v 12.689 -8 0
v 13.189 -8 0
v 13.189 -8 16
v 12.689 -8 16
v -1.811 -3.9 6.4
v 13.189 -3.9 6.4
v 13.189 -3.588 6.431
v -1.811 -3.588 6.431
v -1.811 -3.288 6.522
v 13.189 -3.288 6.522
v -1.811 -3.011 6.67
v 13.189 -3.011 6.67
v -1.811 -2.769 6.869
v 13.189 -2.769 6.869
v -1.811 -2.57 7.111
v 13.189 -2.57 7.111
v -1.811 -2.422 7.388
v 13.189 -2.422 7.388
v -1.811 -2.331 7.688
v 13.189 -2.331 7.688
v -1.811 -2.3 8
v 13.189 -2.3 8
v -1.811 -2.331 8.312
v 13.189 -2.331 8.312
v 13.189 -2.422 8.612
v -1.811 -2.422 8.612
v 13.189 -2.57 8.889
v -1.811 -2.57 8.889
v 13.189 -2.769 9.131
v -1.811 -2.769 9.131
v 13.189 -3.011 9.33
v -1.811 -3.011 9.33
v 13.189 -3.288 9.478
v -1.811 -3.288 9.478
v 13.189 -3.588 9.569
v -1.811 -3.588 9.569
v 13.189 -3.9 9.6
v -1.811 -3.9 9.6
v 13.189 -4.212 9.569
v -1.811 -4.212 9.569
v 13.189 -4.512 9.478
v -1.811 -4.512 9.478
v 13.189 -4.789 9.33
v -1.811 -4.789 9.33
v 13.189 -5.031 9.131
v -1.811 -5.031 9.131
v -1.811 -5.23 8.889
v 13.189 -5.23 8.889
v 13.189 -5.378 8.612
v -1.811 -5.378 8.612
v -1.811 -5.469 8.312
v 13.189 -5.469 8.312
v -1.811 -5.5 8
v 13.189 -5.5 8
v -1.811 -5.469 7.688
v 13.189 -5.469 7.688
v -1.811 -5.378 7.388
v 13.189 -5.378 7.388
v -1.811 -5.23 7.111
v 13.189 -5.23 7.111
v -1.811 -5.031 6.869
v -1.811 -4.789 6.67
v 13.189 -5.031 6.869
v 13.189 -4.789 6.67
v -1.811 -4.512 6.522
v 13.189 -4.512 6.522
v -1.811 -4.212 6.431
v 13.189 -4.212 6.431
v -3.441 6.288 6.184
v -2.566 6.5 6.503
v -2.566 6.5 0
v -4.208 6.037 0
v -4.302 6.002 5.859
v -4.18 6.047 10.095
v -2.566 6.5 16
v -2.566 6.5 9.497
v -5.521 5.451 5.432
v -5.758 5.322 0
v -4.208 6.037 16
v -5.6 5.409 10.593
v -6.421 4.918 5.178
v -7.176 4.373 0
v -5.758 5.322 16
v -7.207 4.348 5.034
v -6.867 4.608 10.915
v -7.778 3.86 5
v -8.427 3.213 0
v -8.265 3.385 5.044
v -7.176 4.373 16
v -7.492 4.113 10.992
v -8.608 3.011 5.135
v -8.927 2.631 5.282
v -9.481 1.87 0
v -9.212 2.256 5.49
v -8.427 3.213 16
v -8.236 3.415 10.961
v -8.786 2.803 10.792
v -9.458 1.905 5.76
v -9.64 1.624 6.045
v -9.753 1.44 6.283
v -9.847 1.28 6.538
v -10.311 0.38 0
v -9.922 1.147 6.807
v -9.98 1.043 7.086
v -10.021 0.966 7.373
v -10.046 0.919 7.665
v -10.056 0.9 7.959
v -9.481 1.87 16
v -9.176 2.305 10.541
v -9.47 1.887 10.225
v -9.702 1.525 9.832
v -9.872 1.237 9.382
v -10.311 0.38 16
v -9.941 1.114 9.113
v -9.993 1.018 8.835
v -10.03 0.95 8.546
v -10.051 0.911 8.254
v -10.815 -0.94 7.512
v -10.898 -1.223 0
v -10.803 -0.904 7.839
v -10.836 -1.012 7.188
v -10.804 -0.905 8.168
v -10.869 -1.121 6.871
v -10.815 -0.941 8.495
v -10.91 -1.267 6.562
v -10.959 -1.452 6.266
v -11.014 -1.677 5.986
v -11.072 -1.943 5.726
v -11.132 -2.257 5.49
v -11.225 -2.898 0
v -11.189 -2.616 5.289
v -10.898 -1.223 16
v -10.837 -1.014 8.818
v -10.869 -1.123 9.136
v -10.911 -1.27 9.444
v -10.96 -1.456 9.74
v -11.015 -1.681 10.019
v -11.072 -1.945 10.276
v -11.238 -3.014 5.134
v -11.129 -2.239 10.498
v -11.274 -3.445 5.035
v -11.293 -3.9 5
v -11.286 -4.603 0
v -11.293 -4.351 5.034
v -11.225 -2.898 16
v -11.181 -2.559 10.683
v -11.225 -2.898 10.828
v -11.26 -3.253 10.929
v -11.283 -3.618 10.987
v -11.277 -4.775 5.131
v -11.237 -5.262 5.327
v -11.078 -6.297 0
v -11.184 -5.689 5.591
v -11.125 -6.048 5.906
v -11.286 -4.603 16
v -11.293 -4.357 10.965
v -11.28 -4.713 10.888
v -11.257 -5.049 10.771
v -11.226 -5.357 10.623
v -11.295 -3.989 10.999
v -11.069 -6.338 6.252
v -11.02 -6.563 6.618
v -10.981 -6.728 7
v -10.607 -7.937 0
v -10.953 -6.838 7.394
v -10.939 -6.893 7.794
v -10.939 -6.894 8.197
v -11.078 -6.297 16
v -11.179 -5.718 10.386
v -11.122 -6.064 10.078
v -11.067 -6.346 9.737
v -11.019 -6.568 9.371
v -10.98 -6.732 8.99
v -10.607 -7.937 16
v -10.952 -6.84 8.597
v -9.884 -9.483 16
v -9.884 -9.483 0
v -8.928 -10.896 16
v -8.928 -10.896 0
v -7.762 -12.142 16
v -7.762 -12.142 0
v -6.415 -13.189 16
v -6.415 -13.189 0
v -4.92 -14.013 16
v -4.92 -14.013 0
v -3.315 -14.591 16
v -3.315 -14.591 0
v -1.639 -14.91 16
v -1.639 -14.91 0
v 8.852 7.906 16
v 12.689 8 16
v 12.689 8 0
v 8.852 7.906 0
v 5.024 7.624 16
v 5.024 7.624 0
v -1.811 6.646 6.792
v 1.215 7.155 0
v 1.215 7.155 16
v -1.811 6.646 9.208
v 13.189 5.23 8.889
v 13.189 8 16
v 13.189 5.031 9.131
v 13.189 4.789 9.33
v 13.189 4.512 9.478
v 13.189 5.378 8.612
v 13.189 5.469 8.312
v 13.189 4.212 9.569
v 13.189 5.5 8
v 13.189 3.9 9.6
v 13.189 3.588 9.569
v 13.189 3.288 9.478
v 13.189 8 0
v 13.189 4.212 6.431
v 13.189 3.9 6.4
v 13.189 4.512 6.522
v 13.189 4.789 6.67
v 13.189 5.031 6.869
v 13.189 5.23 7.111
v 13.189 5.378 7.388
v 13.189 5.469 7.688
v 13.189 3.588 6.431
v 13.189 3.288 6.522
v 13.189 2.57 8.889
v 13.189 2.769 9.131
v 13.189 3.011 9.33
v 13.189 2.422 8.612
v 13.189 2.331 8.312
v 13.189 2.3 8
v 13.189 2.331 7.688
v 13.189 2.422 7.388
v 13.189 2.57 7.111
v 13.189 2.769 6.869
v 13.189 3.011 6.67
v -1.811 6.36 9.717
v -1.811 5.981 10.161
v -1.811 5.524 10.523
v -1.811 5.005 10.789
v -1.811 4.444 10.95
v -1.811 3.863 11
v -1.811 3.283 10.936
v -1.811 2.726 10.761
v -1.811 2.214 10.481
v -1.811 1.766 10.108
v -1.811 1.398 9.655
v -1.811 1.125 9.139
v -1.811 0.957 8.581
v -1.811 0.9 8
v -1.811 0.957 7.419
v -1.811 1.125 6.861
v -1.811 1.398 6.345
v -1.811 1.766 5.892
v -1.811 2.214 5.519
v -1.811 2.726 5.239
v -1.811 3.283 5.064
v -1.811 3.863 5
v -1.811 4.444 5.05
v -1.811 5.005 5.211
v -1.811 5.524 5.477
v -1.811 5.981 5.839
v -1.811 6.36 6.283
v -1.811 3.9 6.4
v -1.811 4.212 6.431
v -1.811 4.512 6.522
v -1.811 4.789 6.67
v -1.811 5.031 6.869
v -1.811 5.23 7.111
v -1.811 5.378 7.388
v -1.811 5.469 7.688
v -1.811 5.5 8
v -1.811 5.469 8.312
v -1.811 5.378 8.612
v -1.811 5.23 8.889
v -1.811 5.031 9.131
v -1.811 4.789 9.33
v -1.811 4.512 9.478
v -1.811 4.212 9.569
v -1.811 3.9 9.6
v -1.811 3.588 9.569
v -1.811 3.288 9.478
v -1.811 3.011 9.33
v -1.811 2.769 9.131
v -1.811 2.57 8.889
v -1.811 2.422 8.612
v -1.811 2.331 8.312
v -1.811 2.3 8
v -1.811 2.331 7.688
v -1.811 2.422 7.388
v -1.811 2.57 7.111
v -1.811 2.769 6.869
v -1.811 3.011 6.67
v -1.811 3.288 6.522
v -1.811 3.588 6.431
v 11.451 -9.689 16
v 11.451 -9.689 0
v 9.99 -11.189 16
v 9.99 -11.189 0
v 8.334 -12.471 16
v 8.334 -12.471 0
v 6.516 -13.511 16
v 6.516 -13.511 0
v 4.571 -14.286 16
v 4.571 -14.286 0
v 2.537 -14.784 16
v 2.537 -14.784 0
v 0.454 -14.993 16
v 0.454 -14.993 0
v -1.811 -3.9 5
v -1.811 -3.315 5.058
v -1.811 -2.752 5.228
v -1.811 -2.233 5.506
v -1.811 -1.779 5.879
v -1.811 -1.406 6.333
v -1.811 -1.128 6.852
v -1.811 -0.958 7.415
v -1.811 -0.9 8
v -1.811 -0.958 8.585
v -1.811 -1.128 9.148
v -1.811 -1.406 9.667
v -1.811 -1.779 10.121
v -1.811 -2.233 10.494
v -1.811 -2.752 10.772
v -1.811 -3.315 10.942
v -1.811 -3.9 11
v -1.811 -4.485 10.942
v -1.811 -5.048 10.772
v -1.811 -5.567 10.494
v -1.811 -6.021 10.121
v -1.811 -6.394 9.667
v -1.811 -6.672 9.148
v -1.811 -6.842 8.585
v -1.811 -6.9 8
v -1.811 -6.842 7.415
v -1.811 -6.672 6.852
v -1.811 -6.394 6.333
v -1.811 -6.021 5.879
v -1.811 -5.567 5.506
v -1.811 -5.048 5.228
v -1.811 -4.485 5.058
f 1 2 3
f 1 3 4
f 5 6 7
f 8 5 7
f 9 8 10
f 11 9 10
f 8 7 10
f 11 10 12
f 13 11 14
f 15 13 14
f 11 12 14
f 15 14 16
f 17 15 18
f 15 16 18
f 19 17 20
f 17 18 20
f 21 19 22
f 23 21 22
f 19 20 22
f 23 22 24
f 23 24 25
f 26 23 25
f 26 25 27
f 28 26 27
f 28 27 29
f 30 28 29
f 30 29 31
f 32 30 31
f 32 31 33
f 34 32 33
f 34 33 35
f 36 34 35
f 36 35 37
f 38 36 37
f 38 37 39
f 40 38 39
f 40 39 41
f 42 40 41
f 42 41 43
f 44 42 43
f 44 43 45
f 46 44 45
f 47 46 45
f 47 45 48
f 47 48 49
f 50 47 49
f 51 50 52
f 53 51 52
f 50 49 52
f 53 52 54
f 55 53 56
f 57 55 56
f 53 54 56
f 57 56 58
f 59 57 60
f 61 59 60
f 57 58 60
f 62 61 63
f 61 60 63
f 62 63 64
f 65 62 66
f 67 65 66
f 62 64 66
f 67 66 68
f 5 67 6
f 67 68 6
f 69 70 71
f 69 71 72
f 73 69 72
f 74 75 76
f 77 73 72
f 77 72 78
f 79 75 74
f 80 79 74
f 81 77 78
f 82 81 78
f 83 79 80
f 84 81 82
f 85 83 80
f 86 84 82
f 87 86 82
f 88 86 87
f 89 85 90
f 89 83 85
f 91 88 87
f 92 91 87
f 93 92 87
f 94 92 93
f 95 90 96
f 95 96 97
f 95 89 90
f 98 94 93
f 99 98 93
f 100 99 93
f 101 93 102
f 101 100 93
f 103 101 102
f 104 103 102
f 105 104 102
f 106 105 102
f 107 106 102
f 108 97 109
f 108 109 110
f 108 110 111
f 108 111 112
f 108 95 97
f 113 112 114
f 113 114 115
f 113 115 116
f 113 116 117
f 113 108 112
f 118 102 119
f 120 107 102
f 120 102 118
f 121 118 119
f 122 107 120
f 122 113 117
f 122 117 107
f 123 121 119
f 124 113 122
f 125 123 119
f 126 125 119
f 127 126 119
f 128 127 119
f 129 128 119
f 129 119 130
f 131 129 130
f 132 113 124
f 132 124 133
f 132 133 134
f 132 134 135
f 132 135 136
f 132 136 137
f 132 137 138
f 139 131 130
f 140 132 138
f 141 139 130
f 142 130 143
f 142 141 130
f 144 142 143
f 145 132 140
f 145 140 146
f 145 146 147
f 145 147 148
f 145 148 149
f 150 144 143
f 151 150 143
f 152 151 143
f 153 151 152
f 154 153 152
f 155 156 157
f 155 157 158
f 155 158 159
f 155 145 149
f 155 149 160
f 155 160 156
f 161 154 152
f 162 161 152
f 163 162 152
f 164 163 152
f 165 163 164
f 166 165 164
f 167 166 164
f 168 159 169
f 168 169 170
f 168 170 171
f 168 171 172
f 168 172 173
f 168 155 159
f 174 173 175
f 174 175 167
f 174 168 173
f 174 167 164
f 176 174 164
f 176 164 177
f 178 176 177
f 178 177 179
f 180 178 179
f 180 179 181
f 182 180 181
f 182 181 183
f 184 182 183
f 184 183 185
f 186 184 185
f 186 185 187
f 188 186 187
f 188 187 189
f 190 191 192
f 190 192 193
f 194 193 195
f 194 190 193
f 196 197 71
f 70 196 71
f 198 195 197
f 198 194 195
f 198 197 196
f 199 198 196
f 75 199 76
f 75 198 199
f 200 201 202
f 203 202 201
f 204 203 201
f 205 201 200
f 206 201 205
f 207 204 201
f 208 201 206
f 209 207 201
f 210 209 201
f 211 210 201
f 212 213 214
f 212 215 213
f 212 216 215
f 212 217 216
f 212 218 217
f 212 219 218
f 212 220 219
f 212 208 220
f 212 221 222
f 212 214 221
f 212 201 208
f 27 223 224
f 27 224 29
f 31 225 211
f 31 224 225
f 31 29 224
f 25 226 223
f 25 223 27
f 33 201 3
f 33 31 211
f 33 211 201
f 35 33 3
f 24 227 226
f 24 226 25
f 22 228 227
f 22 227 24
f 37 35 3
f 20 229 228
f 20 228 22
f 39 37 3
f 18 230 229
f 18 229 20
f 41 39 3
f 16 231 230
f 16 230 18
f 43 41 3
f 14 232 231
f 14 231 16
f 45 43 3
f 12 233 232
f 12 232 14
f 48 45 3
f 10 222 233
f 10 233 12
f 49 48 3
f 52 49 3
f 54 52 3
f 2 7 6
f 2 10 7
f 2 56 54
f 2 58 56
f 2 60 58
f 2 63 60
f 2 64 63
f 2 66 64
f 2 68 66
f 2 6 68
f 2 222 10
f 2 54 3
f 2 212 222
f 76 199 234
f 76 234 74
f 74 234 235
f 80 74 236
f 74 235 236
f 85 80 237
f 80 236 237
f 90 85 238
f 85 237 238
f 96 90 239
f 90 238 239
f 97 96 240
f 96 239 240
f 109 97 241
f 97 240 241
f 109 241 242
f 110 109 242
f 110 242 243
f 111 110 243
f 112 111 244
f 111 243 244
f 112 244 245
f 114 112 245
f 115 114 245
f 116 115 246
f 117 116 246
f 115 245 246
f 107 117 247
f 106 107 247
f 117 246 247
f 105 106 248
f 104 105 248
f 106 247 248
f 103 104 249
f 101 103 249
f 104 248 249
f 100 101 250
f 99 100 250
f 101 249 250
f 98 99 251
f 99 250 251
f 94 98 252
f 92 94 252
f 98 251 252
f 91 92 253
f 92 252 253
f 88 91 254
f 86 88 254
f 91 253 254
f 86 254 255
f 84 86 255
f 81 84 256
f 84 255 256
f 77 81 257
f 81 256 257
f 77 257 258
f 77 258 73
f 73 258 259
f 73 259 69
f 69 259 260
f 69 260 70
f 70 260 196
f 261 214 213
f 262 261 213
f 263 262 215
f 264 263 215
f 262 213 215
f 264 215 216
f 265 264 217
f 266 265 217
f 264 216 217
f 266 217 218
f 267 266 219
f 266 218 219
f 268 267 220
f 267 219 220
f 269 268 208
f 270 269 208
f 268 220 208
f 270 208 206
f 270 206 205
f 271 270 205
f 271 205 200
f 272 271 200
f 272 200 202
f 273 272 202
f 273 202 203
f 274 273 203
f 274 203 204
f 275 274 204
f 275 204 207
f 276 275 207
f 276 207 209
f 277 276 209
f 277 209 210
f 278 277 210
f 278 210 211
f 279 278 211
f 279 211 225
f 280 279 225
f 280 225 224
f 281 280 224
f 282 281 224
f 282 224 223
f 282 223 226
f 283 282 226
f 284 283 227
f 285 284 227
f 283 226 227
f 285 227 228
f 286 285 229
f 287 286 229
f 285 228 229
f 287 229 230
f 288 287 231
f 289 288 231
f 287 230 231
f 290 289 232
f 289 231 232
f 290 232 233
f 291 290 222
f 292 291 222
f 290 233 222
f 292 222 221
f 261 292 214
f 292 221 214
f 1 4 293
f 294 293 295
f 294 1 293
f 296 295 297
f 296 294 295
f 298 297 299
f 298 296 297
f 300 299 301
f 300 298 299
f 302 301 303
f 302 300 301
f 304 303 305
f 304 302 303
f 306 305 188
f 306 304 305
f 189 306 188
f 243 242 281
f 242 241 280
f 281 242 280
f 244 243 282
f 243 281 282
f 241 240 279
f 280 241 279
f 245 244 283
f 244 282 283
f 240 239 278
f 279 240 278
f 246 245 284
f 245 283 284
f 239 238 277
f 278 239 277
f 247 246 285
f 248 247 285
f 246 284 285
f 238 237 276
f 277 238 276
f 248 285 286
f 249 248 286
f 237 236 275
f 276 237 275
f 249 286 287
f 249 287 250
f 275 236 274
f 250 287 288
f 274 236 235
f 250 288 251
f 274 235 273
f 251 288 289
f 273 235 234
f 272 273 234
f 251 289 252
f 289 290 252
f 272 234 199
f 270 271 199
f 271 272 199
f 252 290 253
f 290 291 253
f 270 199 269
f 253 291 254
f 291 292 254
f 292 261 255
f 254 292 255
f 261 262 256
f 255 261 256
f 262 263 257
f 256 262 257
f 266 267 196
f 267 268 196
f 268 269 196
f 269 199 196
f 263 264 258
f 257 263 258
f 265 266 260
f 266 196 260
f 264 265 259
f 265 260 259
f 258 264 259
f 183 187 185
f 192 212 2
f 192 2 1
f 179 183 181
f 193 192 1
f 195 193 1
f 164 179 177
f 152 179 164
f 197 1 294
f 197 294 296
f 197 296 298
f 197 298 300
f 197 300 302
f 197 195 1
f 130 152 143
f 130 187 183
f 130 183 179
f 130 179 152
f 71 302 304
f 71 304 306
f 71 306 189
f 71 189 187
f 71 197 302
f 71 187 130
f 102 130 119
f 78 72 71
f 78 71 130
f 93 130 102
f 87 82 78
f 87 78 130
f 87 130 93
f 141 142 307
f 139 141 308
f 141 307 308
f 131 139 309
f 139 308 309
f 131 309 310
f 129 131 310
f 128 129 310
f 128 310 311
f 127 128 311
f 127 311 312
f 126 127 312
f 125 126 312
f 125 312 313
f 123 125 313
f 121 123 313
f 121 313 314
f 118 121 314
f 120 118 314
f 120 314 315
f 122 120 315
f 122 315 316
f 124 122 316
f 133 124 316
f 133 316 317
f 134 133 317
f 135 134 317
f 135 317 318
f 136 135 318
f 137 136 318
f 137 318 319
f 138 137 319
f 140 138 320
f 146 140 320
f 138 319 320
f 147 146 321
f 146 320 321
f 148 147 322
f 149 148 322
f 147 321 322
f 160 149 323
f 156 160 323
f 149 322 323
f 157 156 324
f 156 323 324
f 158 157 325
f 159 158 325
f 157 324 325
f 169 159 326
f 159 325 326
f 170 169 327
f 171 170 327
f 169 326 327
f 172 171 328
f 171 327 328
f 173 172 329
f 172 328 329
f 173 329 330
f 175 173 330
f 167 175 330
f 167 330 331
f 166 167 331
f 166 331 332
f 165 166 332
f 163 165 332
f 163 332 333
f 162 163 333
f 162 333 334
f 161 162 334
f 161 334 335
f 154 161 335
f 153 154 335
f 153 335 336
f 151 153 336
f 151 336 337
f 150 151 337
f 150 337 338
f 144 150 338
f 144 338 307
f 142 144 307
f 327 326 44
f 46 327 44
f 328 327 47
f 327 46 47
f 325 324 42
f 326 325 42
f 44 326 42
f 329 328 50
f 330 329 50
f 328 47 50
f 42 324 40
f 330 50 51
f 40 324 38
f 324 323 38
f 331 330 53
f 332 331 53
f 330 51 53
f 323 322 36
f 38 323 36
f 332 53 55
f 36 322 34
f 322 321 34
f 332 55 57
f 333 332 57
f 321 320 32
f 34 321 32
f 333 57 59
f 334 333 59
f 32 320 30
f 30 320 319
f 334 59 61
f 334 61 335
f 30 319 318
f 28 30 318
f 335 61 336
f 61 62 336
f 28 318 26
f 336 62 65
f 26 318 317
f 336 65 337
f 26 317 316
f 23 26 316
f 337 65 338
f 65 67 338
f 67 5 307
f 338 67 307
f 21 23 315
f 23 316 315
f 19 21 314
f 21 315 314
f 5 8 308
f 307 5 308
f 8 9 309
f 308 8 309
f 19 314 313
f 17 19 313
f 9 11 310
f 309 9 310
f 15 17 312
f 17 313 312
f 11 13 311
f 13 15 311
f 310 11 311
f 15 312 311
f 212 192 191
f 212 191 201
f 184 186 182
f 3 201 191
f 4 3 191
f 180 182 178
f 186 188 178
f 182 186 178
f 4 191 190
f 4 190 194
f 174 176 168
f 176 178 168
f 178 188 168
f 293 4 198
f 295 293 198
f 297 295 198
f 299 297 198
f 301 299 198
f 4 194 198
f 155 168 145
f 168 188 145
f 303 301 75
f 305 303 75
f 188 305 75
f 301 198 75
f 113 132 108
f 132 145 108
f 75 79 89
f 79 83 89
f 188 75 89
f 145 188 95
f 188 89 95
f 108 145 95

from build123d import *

# Parameters (mm, degrees)
BOSS_EXTRUDE1_DEPTH = 16
CUT_EXTRUDE1_DEPTH  = 27.570660511
SKETCH3_R           = 1.6
CUT_EXTRUDE2_DEPTH  = 33.870624557
SKETCH4_R           = 3
CUT_EXTRUDE3_DEPTH  = 27.570660628


with BuildPart() as part:
    # Sketch1 → Boss-Extrude1 (new body)
    with BuildSketch(Plane.XY):
        with BuildLine():
            Line((12.68857754, 8), (13.18857754, 8))
            Line((13.18857754, 8), (13.18857754, -8))
            Line((13.18857754, -8), (12.68857754, -8))
            ThreePointArc((12.68857754, -8), (-15, 0), (12.68857754, 8))
        make_face()
    extrude(amount=BOSS_EXTRUDE1_DEPTH)

    # Sketch2 → Cut-Extrude1 (cut, through all)
    with BuildSketch(Plane.XY.offset(16)):
        with BuildLine():
            Line((-1.638653084, -14.910225219), (-1.638653084, -32.417274257))
            Line((-1.638653084, -32.417274257), (-50.765498106, -32.417274257))
            Line((-50.765498106, -32.417274257), (-50.765498106, 31.239484016))
            Line((-50.765498106, 31.239484016), (12.68857754, 31.239484016))
            Line((12.68857754, 31.239484016), (12.68857754, 8))
            ThreePointArc((12.68857754, 8), (5.024479817, 7.624084306), (-2.566041885, 6.499946049))
            ThreePointArc((-2.566041885, 6.499946049), (-11.285505358, -4.60291117), (-1.638653084, -14.910225219))
        make_face()
    extrude(amount=-CUT_EXTRUDE1_DEPTH, mode=Mode.SUBTRACT)

    # Sketch3 → Cut-Extrude2 (cut, through all)
    with BuildSketch(Plane(origin=(13.18857754, 0, 0), x_dir=(0, 0, -1), z_dir=(1, 0, 0))):
        with Locations((-8, 3.9)):
            Circle(SKETCH3_R)
        with Locations((-8, -3.9)):
            Circle(SKETCH3_R)
    extrude(amount=-CUT_EXTRUDE2_DEPTH, mode=Mode.SUBTRACT)

    # Sketch4 → Cut-Extrude3 (cut, through all)
    with BuildSketch(Plane(origin=(-1.81142246, 0, 0), x_dir=(0, 0, -1), z_dir=(1, 0, 0))):
        with Locations((-8, 3.9)):
            Circle(SKETCH4_R)
        with Locations((-8, -3.9)):
            Circle(SKETCH4_R)
    extrude(amount=-CUT_EXTRUDE3_DEPTH, mode=Mode.SUBTRACT)


solid = part.part
